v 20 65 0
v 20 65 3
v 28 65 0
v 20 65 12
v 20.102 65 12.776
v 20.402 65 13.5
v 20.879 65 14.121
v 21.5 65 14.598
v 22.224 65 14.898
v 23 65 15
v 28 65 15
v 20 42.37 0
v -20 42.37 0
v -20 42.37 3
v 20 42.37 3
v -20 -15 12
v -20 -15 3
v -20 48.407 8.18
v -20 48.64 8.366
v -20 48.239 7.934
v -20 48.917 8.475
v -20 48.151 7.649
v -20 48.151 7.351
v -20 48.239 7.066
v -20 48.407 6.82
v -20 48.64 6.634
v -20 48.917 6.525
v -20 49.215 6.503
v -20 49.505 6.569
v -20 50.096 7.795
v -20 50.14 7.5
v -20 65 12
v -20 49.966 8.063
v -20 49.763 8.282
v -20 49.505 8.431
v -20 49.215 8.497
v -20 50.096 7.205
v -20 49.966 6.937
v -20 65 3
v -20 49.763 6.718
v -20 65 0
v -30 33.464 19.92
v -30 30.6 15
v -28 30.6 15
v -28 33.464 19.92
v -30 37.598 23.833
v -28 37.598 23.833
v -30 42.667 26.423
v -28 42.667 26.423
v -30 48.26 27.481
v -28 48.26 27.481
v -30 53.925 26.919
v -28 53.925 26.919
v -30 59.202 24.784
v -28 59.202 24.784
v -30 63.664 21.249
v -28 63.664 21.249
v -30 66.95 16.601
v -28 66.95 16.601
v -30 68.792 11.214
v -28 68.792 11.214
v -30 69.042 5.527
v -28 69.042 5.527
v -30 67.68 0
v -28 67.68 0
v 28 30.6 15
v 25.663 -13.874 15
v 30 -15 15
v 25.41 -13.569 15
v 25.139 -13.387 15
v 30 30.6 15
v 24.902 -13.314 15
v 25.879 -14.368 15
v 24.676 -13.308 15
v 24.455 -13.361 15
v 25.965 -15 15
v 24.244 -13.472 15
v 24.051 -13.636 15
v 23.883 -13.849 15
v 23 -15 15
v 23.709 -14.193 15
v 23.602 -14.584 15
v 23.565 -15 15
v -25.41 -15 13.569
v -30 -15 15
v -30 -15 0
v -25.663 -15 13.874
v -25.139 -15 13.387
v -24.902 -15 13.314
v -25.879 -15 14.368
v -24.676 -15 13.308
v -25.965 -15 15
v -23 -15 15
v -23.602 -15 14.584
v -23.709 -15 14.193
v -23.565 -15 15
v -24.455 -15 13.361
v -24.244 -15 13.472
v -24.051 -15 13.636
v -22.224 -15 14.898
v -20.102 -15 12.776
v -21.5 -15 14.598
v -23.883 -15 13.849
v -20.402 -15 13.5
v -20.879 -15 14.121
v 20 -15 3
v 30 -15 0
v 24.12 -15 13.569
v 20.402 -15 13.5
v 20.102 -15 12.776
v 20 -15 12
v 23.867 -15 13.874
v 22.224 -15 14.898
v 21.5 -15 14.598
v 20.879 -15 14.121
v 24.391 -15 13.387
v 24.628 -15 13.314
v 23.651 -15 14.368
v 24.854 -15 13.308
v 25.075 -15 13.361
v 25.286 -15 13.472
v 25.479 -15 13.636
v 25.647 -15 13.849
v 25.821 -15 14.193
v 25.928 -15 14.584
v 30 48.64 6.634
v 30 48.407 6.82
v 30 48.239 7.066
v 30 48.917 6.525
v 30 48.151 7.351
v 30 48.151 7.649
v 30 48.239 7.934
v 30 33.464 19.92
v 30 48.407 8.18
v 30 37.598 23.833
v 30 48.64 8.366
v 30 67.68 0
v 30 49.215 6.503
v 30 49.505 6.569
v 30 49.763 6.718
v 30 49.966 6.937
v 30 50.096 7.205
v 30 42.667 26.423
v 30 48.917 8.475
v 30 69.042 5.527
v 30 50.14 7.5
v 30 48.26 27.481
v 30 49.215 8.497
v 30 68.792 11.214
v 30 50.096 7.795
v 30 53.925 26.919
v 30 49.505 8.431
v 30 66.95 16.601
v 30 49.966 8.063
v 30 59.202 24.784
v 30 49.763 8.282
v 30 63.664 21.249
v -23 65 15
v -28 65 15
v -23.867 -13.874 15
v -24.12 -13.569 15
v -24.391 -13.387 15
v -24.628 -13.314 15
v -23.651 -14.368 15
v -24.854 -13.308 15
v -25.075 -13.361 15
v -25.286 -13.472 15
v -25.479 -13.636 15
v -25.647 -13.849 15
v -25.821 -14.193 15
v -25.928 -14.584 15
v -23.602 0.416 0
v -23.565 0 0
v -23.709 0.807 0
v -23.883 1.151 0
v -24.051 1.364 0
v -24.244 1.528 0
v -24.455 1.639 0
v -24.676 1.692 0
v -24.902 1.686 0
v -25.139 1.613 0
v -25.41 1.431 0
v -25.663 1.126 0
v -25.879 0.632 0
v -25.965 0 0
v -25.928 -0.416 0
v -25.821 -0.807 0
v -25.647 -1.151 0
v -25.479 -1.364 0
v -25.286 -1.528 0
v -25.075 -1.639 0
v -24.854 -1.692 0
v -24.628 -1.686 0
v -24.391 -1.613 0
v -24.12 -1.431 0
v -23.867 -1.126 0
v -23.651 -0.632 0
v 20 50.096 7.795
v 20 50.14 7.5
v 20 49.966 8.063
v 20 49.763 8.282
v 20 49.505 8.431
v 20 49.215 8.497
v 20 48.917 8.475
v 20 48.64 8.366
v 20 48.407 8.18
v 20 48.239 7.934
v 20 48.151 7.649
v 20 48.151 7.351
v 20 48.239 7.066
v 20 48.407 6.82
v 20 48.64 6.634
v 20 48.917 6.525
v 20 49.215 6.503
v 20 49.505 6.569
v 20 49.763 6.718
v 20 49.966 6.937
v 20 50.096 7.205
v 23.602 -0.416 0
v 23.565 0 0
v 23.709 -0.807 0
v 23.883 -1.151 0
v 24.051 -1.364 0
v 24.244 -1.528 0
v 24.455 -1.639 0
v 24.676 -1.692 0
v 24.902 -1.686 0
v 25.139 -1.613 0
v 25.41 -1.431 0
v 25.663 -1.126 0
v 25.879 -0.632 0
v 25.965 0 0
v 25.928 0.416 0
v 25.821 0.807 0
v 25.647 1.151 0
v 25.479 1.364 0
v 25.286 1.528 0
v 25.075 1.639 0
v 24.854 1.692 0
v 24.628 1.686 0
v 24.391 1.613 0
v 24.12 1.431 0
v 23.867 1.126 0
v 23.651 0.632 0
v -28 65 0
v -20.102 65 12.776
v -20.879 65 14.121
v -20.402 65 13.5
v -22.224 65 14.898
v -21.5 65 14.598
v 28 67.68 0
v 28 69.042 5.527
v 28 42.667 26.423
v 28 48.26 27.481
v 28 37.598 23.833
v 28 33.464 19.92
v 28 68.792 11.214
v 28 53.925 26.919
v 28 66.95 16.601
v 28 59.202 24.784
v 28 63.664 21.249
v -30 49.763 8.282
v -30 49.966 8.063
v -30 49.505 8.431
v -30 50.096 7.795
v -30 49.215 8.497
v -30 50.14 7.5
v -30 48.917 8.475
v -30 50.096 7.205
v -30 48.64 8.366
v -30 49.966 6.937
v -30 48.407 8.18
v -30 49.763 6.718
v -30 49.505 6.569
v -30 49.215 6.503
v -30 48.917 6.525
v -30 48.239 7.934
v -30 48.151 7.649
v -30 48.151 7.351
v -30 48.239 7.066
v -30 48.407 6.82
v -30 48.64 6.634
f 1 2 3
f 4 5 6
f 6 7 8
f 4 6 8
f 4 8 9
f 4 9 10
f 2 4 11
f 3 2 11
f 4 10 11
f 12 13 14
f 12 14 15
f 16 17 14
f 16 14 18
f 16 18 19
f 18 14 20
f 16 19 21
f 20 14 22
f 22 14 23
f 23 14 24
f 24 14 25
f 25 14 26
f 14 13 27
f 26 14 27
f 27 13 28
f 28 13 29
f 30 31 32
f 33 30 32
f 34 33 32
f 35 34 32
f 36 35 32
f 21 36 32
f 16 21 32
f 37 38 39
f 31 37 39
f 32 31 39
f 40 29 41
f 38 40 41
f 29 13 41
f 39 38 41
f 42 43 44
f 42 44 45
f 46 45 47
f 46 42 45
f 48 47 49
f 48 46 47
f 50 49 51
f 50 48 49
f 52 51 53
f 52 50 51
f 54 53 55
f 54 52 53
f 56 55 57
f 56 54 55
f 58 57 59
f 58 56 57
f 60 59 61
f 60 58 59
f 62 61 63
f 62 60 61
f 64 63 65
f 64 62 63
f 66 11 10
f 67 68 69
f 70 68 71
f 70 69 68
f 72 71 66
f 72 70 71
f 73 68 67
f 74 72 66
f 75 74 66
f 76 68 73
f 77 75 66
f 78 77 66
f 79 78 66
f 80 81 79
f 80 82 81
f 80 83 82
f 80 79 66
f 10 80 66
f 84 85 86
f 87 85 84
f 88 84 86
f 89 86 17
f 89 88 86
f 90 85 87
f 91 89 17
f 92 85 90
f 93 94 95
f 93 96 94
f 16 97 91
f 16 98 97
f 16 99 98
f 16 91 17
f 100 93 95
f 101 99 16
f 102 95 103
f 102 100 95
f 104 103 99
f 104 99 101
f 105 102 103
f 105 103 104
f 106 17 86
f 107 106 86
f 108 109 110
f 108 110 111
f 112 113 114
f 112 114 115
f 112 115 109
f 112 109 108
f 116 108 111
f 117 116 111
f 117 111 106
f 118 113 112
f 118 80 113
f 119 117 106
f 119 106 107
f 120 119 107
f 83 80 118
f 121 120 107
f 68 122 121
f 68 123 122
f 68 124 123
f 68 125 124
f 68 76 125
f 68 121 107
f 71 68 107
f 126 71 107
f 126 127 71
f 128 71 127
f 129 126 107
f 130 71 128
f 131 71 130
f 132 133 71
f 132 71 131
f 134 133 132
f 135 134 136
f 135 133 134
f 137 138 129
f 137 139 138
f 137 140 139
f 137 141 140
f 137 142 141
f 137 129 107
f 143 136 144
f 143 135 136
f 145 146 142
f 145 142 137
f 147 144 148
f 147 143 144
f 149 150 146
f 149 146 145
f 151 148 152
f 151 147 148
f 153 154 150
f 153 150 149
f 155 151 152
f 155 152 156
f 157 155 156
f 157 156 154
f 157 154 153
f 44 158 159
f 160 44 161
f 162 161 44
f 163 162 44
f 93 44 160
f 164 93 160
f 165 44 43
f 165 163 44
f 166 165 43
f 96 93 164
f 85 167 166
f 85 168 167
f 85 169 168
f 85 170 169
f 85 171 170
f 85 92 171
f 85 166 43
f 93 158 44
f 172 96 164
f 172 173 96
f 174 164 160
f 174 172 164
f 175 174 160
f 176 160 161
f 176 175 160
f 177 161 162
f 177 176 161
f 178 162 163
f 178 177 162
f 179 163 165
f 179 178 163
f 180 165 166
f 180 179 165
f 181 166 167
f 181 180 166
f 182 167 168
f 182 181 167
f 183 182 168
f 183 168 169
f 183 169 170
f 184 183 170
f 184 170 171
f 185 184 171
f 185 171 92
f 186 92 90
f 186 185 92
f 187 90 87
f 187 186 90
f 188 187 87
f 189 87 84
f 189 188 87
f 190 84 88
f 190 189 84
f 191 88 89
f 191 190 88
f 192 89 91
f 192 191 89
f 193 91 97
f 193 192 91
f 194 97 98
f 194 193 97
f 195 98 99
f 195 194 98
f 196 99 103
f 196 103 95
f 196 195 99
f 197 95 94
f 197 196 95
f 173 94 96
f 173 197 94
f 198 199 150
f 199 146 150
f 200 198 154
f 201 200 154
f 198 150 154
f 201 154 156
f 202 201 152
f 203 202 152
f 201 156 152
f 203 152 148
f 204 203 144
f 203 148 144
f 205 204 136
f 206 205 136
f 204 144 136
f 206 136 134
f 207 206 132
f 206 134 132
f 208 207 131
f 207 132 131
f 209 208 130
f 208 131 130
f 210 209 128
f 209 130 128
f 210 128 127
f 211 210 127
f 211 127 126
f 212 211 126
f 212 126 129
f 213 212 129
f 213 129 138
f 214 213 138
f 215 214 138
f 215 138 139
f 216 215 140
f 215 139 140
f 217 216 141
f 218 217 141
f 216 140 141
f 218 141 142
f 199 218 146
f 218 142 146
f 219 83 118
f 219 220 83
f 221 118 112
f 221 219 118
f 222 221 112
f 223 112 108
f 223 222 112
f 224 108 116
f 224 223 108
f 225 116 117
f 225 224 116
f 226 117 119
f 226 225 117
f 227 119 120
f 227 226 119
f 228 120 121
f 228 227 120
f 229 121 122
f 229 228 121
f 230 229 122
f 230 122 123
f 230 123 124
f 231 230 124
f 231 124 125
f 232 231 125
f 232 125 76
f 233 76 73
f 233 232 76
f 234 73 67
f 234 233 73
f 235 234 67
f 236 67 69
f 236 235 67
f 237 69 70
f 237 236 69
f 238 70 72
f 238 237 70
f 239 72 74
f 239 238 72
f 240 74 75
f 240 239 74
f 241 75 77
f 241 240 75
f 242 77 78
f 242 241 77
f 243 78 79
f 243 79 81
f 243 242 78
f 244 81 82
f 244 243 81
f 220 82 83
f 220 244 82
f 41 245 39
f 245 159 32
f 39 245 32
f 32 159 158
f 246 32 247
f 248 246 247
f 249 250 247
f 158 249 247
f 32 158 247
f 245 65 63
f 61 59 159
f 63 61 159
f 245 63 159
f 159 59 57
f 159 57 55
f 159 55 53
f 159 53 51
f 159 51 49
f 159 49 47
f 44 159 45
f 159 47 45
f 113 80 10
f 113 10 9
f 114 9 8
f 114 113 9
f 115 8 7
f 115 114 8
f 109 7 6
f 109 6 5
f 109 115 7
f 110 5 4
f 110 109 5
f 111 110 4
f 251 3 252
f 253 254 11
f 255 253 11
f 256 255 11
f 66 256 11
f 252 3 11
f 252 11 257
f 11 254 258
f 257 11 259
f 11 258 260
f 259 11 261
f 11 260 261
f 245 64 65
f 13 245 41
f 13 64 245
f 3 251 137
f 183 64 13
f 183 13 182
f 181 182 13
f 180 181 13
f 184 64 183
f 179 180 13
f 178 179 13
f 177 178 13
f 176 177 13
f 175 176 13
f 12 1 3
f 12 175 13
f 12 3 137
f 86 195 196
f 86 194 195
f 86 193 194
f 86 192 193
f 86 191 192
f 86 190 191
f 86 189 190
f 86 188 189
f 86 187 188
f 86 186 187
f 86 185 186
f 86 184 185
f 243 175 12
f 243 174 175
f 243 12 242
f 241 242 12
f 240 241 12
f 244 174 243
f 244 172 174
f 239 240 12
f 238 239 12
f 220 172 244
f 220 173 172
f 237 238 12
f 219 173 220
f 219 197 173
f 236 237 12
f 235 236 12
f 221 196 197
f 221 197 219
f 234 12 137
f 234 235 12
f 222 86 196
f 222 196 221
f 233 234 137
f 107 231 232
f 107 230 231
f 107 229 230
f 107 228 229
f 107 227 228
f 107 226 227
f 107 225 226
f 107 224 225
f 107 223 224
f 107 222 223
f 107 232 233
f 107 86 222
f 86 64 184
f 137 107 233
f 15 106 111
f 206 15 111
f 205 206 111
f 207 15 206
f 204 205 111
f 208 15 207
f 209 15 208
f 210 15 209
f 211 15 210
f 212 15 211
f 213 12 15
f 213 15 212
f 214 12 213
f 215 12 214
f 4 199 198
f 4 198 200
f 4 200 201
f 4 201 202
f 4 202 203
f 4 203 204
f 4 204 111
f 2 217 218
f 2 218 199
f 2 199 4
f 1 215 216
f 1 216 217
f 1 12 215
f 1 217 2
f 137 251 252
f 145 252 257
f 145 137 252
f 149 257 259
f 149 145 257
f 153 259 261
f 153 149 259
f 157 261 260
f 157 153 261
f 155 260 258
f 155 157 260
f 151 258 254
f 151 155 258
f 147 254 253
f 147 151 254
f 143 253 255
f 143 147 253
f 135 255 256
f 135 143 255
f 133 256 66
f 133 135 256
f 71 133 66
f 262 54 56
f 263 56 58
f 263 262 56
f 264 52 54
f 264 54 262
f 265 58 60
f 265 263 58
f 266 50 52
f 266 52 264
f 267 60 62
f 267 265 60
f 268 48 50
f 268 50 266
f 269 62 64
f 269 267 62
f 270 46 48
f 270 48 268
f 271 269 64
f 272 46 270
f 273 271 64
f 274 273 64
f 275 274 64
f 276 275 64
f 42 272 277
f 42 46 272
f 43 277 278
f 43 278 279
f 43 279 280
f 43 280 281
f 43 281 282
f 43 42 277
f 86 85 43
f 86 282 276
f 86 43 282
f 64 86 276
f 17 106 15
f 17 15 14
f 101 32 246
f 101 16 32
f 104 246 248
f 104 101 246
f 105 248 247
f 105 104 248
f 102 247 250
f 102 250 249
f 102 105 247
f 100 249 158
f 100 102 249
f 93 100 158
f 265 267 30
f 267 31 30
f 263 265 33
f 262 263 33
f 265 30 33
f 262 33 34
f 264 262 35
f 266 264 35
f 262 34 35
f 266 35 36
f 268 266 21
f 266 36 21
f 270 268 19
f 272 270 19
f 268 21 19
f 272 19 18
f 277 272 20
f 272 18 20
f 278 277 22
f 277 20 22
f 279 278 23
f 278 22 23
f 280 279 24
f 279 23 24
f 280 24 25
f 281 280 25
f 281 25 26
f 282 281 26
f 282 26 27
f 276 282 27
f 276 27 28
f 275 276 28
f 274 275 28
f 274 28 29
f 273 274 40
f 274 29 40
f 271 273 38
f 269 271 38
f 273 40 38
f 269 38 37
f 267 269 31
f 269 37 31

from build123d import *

# Parameters (mm, degrees)
F3_DEPTH      = 15
F3_DEPTH_BACK = 65
F4_R          = 1.2
F5_DEPTH      = 124.25
F5_DEPTH_BACK = 109.5
F6_R          = 20
F8_DEPTH      = 2
F7_R          = 20
F9_DEPTH      = 2
F10_W         = 125.272244215
F10_H         = 20.9059882909
F11_DEPTH     = 40
F12_W         = 40
F12_H         = 22.6302481089
F13_DEPTH     = 10
F14_R         = 1
F15_DEPTH     = 50


with BuildPart() as f3:
    # F2 (on Front) → F3 (new body, two sides)
    with BuildSketch(Plane.XZ) as f3_sk:
        with BuildLine():
            Line((-30, 15), (-30, 0))
            Line((-30, 0), (30, 0))
            Line((30, 0), (30, 15))
            Line((30, 15), (23, 15))
            ThreePointArc((23, 15), (20.8786796564, 14.1213203436), (20, 12))
            Line((20, 12), (20, 3))
            Line((20, 3), (-20, 3))
            Line((-20, 3), (-20, 12))
            ThreePointArc((-20, 12), (-20.8786796564, 14.1213203436), (-23, 15))
            Line((-23, 15), (-30, 15))
        make_face()
    extrude(amount=F3_DEPTH)
    extrude(f3_sk.sketch, amount=-F3_DEPTH_BACK)

    # F4 (on face) → F5 (cut, two sides)
    with BuildSketch(Plane(origin=(0, 0, 0), x_dir=(1, 0, 0), z_dir=(0, -0.7071067812, 0.7071067812))) as f5_sk:
        with BuildLine():
            ThreePointArc((25.965, 0), (24.765, 1.2), (23.565, 0))
            ThreePointArc((23.565, 0), (24.765, -1.2), (25.965, 0))
        make_face()
        with Locations((-24.765, 0)):
            Circle(F4_R)
    extrude(amount=F5_DEPTH, mode=Mode.SUBTRACT)
    extrude(f5_sk.sketch, amount=-F5_DEPTH_BACK, mode=Mode.SUBTRACT)

    # F6 (on face) → F8 (join)
    with BuildSketch(Plane.YZ.offset(30)):
        with Locations((49.14, 7.5)):
            Circle(F6_R)
    extrude(amount=-F8_DEPTH)

    # F7 (on face) → F9 (join)
    with BuildSketch(Plane(origin=(-30, 0, 0), x_dir=(0, -1, 0), z_dir=(-1, 0, 0))):
        with Locations((-49.14, 7.5)):
            Circle(F7_R)
    extrude(amount=-F9_DEPTH)

    # F10 (on Right) → F11 (cut, symmetric)
    with BuildSketch(Plane.YZ):
        with Locations((62.6361221075, -10.4529941455)):
            Rectangle(F10_W, F10_H)
    extrude(amount=F11_DEPTH, both=True, mode=Mode.SUBTRACT)

    # F12 (on Top) → F13 (cut)
    with BuildSketch(Plane.XY):
        with Locations((0, 53.6848759456)):
            Rectangle(F12_W, F12_H)
    extrude(amount=F13_DEPTH, mode=Mode.SUBTRACT)

    # F14 (on Right) → F15 (cut, symmetric)
    with BuildSketch(Plane.YZ):
        with Locations((49.14, 7.5)):
            Circle(F14_R)
    extrude(amount=F15_DEPTH, both=True, mode=Mode.SUBTRACT)


solid = f3.part
